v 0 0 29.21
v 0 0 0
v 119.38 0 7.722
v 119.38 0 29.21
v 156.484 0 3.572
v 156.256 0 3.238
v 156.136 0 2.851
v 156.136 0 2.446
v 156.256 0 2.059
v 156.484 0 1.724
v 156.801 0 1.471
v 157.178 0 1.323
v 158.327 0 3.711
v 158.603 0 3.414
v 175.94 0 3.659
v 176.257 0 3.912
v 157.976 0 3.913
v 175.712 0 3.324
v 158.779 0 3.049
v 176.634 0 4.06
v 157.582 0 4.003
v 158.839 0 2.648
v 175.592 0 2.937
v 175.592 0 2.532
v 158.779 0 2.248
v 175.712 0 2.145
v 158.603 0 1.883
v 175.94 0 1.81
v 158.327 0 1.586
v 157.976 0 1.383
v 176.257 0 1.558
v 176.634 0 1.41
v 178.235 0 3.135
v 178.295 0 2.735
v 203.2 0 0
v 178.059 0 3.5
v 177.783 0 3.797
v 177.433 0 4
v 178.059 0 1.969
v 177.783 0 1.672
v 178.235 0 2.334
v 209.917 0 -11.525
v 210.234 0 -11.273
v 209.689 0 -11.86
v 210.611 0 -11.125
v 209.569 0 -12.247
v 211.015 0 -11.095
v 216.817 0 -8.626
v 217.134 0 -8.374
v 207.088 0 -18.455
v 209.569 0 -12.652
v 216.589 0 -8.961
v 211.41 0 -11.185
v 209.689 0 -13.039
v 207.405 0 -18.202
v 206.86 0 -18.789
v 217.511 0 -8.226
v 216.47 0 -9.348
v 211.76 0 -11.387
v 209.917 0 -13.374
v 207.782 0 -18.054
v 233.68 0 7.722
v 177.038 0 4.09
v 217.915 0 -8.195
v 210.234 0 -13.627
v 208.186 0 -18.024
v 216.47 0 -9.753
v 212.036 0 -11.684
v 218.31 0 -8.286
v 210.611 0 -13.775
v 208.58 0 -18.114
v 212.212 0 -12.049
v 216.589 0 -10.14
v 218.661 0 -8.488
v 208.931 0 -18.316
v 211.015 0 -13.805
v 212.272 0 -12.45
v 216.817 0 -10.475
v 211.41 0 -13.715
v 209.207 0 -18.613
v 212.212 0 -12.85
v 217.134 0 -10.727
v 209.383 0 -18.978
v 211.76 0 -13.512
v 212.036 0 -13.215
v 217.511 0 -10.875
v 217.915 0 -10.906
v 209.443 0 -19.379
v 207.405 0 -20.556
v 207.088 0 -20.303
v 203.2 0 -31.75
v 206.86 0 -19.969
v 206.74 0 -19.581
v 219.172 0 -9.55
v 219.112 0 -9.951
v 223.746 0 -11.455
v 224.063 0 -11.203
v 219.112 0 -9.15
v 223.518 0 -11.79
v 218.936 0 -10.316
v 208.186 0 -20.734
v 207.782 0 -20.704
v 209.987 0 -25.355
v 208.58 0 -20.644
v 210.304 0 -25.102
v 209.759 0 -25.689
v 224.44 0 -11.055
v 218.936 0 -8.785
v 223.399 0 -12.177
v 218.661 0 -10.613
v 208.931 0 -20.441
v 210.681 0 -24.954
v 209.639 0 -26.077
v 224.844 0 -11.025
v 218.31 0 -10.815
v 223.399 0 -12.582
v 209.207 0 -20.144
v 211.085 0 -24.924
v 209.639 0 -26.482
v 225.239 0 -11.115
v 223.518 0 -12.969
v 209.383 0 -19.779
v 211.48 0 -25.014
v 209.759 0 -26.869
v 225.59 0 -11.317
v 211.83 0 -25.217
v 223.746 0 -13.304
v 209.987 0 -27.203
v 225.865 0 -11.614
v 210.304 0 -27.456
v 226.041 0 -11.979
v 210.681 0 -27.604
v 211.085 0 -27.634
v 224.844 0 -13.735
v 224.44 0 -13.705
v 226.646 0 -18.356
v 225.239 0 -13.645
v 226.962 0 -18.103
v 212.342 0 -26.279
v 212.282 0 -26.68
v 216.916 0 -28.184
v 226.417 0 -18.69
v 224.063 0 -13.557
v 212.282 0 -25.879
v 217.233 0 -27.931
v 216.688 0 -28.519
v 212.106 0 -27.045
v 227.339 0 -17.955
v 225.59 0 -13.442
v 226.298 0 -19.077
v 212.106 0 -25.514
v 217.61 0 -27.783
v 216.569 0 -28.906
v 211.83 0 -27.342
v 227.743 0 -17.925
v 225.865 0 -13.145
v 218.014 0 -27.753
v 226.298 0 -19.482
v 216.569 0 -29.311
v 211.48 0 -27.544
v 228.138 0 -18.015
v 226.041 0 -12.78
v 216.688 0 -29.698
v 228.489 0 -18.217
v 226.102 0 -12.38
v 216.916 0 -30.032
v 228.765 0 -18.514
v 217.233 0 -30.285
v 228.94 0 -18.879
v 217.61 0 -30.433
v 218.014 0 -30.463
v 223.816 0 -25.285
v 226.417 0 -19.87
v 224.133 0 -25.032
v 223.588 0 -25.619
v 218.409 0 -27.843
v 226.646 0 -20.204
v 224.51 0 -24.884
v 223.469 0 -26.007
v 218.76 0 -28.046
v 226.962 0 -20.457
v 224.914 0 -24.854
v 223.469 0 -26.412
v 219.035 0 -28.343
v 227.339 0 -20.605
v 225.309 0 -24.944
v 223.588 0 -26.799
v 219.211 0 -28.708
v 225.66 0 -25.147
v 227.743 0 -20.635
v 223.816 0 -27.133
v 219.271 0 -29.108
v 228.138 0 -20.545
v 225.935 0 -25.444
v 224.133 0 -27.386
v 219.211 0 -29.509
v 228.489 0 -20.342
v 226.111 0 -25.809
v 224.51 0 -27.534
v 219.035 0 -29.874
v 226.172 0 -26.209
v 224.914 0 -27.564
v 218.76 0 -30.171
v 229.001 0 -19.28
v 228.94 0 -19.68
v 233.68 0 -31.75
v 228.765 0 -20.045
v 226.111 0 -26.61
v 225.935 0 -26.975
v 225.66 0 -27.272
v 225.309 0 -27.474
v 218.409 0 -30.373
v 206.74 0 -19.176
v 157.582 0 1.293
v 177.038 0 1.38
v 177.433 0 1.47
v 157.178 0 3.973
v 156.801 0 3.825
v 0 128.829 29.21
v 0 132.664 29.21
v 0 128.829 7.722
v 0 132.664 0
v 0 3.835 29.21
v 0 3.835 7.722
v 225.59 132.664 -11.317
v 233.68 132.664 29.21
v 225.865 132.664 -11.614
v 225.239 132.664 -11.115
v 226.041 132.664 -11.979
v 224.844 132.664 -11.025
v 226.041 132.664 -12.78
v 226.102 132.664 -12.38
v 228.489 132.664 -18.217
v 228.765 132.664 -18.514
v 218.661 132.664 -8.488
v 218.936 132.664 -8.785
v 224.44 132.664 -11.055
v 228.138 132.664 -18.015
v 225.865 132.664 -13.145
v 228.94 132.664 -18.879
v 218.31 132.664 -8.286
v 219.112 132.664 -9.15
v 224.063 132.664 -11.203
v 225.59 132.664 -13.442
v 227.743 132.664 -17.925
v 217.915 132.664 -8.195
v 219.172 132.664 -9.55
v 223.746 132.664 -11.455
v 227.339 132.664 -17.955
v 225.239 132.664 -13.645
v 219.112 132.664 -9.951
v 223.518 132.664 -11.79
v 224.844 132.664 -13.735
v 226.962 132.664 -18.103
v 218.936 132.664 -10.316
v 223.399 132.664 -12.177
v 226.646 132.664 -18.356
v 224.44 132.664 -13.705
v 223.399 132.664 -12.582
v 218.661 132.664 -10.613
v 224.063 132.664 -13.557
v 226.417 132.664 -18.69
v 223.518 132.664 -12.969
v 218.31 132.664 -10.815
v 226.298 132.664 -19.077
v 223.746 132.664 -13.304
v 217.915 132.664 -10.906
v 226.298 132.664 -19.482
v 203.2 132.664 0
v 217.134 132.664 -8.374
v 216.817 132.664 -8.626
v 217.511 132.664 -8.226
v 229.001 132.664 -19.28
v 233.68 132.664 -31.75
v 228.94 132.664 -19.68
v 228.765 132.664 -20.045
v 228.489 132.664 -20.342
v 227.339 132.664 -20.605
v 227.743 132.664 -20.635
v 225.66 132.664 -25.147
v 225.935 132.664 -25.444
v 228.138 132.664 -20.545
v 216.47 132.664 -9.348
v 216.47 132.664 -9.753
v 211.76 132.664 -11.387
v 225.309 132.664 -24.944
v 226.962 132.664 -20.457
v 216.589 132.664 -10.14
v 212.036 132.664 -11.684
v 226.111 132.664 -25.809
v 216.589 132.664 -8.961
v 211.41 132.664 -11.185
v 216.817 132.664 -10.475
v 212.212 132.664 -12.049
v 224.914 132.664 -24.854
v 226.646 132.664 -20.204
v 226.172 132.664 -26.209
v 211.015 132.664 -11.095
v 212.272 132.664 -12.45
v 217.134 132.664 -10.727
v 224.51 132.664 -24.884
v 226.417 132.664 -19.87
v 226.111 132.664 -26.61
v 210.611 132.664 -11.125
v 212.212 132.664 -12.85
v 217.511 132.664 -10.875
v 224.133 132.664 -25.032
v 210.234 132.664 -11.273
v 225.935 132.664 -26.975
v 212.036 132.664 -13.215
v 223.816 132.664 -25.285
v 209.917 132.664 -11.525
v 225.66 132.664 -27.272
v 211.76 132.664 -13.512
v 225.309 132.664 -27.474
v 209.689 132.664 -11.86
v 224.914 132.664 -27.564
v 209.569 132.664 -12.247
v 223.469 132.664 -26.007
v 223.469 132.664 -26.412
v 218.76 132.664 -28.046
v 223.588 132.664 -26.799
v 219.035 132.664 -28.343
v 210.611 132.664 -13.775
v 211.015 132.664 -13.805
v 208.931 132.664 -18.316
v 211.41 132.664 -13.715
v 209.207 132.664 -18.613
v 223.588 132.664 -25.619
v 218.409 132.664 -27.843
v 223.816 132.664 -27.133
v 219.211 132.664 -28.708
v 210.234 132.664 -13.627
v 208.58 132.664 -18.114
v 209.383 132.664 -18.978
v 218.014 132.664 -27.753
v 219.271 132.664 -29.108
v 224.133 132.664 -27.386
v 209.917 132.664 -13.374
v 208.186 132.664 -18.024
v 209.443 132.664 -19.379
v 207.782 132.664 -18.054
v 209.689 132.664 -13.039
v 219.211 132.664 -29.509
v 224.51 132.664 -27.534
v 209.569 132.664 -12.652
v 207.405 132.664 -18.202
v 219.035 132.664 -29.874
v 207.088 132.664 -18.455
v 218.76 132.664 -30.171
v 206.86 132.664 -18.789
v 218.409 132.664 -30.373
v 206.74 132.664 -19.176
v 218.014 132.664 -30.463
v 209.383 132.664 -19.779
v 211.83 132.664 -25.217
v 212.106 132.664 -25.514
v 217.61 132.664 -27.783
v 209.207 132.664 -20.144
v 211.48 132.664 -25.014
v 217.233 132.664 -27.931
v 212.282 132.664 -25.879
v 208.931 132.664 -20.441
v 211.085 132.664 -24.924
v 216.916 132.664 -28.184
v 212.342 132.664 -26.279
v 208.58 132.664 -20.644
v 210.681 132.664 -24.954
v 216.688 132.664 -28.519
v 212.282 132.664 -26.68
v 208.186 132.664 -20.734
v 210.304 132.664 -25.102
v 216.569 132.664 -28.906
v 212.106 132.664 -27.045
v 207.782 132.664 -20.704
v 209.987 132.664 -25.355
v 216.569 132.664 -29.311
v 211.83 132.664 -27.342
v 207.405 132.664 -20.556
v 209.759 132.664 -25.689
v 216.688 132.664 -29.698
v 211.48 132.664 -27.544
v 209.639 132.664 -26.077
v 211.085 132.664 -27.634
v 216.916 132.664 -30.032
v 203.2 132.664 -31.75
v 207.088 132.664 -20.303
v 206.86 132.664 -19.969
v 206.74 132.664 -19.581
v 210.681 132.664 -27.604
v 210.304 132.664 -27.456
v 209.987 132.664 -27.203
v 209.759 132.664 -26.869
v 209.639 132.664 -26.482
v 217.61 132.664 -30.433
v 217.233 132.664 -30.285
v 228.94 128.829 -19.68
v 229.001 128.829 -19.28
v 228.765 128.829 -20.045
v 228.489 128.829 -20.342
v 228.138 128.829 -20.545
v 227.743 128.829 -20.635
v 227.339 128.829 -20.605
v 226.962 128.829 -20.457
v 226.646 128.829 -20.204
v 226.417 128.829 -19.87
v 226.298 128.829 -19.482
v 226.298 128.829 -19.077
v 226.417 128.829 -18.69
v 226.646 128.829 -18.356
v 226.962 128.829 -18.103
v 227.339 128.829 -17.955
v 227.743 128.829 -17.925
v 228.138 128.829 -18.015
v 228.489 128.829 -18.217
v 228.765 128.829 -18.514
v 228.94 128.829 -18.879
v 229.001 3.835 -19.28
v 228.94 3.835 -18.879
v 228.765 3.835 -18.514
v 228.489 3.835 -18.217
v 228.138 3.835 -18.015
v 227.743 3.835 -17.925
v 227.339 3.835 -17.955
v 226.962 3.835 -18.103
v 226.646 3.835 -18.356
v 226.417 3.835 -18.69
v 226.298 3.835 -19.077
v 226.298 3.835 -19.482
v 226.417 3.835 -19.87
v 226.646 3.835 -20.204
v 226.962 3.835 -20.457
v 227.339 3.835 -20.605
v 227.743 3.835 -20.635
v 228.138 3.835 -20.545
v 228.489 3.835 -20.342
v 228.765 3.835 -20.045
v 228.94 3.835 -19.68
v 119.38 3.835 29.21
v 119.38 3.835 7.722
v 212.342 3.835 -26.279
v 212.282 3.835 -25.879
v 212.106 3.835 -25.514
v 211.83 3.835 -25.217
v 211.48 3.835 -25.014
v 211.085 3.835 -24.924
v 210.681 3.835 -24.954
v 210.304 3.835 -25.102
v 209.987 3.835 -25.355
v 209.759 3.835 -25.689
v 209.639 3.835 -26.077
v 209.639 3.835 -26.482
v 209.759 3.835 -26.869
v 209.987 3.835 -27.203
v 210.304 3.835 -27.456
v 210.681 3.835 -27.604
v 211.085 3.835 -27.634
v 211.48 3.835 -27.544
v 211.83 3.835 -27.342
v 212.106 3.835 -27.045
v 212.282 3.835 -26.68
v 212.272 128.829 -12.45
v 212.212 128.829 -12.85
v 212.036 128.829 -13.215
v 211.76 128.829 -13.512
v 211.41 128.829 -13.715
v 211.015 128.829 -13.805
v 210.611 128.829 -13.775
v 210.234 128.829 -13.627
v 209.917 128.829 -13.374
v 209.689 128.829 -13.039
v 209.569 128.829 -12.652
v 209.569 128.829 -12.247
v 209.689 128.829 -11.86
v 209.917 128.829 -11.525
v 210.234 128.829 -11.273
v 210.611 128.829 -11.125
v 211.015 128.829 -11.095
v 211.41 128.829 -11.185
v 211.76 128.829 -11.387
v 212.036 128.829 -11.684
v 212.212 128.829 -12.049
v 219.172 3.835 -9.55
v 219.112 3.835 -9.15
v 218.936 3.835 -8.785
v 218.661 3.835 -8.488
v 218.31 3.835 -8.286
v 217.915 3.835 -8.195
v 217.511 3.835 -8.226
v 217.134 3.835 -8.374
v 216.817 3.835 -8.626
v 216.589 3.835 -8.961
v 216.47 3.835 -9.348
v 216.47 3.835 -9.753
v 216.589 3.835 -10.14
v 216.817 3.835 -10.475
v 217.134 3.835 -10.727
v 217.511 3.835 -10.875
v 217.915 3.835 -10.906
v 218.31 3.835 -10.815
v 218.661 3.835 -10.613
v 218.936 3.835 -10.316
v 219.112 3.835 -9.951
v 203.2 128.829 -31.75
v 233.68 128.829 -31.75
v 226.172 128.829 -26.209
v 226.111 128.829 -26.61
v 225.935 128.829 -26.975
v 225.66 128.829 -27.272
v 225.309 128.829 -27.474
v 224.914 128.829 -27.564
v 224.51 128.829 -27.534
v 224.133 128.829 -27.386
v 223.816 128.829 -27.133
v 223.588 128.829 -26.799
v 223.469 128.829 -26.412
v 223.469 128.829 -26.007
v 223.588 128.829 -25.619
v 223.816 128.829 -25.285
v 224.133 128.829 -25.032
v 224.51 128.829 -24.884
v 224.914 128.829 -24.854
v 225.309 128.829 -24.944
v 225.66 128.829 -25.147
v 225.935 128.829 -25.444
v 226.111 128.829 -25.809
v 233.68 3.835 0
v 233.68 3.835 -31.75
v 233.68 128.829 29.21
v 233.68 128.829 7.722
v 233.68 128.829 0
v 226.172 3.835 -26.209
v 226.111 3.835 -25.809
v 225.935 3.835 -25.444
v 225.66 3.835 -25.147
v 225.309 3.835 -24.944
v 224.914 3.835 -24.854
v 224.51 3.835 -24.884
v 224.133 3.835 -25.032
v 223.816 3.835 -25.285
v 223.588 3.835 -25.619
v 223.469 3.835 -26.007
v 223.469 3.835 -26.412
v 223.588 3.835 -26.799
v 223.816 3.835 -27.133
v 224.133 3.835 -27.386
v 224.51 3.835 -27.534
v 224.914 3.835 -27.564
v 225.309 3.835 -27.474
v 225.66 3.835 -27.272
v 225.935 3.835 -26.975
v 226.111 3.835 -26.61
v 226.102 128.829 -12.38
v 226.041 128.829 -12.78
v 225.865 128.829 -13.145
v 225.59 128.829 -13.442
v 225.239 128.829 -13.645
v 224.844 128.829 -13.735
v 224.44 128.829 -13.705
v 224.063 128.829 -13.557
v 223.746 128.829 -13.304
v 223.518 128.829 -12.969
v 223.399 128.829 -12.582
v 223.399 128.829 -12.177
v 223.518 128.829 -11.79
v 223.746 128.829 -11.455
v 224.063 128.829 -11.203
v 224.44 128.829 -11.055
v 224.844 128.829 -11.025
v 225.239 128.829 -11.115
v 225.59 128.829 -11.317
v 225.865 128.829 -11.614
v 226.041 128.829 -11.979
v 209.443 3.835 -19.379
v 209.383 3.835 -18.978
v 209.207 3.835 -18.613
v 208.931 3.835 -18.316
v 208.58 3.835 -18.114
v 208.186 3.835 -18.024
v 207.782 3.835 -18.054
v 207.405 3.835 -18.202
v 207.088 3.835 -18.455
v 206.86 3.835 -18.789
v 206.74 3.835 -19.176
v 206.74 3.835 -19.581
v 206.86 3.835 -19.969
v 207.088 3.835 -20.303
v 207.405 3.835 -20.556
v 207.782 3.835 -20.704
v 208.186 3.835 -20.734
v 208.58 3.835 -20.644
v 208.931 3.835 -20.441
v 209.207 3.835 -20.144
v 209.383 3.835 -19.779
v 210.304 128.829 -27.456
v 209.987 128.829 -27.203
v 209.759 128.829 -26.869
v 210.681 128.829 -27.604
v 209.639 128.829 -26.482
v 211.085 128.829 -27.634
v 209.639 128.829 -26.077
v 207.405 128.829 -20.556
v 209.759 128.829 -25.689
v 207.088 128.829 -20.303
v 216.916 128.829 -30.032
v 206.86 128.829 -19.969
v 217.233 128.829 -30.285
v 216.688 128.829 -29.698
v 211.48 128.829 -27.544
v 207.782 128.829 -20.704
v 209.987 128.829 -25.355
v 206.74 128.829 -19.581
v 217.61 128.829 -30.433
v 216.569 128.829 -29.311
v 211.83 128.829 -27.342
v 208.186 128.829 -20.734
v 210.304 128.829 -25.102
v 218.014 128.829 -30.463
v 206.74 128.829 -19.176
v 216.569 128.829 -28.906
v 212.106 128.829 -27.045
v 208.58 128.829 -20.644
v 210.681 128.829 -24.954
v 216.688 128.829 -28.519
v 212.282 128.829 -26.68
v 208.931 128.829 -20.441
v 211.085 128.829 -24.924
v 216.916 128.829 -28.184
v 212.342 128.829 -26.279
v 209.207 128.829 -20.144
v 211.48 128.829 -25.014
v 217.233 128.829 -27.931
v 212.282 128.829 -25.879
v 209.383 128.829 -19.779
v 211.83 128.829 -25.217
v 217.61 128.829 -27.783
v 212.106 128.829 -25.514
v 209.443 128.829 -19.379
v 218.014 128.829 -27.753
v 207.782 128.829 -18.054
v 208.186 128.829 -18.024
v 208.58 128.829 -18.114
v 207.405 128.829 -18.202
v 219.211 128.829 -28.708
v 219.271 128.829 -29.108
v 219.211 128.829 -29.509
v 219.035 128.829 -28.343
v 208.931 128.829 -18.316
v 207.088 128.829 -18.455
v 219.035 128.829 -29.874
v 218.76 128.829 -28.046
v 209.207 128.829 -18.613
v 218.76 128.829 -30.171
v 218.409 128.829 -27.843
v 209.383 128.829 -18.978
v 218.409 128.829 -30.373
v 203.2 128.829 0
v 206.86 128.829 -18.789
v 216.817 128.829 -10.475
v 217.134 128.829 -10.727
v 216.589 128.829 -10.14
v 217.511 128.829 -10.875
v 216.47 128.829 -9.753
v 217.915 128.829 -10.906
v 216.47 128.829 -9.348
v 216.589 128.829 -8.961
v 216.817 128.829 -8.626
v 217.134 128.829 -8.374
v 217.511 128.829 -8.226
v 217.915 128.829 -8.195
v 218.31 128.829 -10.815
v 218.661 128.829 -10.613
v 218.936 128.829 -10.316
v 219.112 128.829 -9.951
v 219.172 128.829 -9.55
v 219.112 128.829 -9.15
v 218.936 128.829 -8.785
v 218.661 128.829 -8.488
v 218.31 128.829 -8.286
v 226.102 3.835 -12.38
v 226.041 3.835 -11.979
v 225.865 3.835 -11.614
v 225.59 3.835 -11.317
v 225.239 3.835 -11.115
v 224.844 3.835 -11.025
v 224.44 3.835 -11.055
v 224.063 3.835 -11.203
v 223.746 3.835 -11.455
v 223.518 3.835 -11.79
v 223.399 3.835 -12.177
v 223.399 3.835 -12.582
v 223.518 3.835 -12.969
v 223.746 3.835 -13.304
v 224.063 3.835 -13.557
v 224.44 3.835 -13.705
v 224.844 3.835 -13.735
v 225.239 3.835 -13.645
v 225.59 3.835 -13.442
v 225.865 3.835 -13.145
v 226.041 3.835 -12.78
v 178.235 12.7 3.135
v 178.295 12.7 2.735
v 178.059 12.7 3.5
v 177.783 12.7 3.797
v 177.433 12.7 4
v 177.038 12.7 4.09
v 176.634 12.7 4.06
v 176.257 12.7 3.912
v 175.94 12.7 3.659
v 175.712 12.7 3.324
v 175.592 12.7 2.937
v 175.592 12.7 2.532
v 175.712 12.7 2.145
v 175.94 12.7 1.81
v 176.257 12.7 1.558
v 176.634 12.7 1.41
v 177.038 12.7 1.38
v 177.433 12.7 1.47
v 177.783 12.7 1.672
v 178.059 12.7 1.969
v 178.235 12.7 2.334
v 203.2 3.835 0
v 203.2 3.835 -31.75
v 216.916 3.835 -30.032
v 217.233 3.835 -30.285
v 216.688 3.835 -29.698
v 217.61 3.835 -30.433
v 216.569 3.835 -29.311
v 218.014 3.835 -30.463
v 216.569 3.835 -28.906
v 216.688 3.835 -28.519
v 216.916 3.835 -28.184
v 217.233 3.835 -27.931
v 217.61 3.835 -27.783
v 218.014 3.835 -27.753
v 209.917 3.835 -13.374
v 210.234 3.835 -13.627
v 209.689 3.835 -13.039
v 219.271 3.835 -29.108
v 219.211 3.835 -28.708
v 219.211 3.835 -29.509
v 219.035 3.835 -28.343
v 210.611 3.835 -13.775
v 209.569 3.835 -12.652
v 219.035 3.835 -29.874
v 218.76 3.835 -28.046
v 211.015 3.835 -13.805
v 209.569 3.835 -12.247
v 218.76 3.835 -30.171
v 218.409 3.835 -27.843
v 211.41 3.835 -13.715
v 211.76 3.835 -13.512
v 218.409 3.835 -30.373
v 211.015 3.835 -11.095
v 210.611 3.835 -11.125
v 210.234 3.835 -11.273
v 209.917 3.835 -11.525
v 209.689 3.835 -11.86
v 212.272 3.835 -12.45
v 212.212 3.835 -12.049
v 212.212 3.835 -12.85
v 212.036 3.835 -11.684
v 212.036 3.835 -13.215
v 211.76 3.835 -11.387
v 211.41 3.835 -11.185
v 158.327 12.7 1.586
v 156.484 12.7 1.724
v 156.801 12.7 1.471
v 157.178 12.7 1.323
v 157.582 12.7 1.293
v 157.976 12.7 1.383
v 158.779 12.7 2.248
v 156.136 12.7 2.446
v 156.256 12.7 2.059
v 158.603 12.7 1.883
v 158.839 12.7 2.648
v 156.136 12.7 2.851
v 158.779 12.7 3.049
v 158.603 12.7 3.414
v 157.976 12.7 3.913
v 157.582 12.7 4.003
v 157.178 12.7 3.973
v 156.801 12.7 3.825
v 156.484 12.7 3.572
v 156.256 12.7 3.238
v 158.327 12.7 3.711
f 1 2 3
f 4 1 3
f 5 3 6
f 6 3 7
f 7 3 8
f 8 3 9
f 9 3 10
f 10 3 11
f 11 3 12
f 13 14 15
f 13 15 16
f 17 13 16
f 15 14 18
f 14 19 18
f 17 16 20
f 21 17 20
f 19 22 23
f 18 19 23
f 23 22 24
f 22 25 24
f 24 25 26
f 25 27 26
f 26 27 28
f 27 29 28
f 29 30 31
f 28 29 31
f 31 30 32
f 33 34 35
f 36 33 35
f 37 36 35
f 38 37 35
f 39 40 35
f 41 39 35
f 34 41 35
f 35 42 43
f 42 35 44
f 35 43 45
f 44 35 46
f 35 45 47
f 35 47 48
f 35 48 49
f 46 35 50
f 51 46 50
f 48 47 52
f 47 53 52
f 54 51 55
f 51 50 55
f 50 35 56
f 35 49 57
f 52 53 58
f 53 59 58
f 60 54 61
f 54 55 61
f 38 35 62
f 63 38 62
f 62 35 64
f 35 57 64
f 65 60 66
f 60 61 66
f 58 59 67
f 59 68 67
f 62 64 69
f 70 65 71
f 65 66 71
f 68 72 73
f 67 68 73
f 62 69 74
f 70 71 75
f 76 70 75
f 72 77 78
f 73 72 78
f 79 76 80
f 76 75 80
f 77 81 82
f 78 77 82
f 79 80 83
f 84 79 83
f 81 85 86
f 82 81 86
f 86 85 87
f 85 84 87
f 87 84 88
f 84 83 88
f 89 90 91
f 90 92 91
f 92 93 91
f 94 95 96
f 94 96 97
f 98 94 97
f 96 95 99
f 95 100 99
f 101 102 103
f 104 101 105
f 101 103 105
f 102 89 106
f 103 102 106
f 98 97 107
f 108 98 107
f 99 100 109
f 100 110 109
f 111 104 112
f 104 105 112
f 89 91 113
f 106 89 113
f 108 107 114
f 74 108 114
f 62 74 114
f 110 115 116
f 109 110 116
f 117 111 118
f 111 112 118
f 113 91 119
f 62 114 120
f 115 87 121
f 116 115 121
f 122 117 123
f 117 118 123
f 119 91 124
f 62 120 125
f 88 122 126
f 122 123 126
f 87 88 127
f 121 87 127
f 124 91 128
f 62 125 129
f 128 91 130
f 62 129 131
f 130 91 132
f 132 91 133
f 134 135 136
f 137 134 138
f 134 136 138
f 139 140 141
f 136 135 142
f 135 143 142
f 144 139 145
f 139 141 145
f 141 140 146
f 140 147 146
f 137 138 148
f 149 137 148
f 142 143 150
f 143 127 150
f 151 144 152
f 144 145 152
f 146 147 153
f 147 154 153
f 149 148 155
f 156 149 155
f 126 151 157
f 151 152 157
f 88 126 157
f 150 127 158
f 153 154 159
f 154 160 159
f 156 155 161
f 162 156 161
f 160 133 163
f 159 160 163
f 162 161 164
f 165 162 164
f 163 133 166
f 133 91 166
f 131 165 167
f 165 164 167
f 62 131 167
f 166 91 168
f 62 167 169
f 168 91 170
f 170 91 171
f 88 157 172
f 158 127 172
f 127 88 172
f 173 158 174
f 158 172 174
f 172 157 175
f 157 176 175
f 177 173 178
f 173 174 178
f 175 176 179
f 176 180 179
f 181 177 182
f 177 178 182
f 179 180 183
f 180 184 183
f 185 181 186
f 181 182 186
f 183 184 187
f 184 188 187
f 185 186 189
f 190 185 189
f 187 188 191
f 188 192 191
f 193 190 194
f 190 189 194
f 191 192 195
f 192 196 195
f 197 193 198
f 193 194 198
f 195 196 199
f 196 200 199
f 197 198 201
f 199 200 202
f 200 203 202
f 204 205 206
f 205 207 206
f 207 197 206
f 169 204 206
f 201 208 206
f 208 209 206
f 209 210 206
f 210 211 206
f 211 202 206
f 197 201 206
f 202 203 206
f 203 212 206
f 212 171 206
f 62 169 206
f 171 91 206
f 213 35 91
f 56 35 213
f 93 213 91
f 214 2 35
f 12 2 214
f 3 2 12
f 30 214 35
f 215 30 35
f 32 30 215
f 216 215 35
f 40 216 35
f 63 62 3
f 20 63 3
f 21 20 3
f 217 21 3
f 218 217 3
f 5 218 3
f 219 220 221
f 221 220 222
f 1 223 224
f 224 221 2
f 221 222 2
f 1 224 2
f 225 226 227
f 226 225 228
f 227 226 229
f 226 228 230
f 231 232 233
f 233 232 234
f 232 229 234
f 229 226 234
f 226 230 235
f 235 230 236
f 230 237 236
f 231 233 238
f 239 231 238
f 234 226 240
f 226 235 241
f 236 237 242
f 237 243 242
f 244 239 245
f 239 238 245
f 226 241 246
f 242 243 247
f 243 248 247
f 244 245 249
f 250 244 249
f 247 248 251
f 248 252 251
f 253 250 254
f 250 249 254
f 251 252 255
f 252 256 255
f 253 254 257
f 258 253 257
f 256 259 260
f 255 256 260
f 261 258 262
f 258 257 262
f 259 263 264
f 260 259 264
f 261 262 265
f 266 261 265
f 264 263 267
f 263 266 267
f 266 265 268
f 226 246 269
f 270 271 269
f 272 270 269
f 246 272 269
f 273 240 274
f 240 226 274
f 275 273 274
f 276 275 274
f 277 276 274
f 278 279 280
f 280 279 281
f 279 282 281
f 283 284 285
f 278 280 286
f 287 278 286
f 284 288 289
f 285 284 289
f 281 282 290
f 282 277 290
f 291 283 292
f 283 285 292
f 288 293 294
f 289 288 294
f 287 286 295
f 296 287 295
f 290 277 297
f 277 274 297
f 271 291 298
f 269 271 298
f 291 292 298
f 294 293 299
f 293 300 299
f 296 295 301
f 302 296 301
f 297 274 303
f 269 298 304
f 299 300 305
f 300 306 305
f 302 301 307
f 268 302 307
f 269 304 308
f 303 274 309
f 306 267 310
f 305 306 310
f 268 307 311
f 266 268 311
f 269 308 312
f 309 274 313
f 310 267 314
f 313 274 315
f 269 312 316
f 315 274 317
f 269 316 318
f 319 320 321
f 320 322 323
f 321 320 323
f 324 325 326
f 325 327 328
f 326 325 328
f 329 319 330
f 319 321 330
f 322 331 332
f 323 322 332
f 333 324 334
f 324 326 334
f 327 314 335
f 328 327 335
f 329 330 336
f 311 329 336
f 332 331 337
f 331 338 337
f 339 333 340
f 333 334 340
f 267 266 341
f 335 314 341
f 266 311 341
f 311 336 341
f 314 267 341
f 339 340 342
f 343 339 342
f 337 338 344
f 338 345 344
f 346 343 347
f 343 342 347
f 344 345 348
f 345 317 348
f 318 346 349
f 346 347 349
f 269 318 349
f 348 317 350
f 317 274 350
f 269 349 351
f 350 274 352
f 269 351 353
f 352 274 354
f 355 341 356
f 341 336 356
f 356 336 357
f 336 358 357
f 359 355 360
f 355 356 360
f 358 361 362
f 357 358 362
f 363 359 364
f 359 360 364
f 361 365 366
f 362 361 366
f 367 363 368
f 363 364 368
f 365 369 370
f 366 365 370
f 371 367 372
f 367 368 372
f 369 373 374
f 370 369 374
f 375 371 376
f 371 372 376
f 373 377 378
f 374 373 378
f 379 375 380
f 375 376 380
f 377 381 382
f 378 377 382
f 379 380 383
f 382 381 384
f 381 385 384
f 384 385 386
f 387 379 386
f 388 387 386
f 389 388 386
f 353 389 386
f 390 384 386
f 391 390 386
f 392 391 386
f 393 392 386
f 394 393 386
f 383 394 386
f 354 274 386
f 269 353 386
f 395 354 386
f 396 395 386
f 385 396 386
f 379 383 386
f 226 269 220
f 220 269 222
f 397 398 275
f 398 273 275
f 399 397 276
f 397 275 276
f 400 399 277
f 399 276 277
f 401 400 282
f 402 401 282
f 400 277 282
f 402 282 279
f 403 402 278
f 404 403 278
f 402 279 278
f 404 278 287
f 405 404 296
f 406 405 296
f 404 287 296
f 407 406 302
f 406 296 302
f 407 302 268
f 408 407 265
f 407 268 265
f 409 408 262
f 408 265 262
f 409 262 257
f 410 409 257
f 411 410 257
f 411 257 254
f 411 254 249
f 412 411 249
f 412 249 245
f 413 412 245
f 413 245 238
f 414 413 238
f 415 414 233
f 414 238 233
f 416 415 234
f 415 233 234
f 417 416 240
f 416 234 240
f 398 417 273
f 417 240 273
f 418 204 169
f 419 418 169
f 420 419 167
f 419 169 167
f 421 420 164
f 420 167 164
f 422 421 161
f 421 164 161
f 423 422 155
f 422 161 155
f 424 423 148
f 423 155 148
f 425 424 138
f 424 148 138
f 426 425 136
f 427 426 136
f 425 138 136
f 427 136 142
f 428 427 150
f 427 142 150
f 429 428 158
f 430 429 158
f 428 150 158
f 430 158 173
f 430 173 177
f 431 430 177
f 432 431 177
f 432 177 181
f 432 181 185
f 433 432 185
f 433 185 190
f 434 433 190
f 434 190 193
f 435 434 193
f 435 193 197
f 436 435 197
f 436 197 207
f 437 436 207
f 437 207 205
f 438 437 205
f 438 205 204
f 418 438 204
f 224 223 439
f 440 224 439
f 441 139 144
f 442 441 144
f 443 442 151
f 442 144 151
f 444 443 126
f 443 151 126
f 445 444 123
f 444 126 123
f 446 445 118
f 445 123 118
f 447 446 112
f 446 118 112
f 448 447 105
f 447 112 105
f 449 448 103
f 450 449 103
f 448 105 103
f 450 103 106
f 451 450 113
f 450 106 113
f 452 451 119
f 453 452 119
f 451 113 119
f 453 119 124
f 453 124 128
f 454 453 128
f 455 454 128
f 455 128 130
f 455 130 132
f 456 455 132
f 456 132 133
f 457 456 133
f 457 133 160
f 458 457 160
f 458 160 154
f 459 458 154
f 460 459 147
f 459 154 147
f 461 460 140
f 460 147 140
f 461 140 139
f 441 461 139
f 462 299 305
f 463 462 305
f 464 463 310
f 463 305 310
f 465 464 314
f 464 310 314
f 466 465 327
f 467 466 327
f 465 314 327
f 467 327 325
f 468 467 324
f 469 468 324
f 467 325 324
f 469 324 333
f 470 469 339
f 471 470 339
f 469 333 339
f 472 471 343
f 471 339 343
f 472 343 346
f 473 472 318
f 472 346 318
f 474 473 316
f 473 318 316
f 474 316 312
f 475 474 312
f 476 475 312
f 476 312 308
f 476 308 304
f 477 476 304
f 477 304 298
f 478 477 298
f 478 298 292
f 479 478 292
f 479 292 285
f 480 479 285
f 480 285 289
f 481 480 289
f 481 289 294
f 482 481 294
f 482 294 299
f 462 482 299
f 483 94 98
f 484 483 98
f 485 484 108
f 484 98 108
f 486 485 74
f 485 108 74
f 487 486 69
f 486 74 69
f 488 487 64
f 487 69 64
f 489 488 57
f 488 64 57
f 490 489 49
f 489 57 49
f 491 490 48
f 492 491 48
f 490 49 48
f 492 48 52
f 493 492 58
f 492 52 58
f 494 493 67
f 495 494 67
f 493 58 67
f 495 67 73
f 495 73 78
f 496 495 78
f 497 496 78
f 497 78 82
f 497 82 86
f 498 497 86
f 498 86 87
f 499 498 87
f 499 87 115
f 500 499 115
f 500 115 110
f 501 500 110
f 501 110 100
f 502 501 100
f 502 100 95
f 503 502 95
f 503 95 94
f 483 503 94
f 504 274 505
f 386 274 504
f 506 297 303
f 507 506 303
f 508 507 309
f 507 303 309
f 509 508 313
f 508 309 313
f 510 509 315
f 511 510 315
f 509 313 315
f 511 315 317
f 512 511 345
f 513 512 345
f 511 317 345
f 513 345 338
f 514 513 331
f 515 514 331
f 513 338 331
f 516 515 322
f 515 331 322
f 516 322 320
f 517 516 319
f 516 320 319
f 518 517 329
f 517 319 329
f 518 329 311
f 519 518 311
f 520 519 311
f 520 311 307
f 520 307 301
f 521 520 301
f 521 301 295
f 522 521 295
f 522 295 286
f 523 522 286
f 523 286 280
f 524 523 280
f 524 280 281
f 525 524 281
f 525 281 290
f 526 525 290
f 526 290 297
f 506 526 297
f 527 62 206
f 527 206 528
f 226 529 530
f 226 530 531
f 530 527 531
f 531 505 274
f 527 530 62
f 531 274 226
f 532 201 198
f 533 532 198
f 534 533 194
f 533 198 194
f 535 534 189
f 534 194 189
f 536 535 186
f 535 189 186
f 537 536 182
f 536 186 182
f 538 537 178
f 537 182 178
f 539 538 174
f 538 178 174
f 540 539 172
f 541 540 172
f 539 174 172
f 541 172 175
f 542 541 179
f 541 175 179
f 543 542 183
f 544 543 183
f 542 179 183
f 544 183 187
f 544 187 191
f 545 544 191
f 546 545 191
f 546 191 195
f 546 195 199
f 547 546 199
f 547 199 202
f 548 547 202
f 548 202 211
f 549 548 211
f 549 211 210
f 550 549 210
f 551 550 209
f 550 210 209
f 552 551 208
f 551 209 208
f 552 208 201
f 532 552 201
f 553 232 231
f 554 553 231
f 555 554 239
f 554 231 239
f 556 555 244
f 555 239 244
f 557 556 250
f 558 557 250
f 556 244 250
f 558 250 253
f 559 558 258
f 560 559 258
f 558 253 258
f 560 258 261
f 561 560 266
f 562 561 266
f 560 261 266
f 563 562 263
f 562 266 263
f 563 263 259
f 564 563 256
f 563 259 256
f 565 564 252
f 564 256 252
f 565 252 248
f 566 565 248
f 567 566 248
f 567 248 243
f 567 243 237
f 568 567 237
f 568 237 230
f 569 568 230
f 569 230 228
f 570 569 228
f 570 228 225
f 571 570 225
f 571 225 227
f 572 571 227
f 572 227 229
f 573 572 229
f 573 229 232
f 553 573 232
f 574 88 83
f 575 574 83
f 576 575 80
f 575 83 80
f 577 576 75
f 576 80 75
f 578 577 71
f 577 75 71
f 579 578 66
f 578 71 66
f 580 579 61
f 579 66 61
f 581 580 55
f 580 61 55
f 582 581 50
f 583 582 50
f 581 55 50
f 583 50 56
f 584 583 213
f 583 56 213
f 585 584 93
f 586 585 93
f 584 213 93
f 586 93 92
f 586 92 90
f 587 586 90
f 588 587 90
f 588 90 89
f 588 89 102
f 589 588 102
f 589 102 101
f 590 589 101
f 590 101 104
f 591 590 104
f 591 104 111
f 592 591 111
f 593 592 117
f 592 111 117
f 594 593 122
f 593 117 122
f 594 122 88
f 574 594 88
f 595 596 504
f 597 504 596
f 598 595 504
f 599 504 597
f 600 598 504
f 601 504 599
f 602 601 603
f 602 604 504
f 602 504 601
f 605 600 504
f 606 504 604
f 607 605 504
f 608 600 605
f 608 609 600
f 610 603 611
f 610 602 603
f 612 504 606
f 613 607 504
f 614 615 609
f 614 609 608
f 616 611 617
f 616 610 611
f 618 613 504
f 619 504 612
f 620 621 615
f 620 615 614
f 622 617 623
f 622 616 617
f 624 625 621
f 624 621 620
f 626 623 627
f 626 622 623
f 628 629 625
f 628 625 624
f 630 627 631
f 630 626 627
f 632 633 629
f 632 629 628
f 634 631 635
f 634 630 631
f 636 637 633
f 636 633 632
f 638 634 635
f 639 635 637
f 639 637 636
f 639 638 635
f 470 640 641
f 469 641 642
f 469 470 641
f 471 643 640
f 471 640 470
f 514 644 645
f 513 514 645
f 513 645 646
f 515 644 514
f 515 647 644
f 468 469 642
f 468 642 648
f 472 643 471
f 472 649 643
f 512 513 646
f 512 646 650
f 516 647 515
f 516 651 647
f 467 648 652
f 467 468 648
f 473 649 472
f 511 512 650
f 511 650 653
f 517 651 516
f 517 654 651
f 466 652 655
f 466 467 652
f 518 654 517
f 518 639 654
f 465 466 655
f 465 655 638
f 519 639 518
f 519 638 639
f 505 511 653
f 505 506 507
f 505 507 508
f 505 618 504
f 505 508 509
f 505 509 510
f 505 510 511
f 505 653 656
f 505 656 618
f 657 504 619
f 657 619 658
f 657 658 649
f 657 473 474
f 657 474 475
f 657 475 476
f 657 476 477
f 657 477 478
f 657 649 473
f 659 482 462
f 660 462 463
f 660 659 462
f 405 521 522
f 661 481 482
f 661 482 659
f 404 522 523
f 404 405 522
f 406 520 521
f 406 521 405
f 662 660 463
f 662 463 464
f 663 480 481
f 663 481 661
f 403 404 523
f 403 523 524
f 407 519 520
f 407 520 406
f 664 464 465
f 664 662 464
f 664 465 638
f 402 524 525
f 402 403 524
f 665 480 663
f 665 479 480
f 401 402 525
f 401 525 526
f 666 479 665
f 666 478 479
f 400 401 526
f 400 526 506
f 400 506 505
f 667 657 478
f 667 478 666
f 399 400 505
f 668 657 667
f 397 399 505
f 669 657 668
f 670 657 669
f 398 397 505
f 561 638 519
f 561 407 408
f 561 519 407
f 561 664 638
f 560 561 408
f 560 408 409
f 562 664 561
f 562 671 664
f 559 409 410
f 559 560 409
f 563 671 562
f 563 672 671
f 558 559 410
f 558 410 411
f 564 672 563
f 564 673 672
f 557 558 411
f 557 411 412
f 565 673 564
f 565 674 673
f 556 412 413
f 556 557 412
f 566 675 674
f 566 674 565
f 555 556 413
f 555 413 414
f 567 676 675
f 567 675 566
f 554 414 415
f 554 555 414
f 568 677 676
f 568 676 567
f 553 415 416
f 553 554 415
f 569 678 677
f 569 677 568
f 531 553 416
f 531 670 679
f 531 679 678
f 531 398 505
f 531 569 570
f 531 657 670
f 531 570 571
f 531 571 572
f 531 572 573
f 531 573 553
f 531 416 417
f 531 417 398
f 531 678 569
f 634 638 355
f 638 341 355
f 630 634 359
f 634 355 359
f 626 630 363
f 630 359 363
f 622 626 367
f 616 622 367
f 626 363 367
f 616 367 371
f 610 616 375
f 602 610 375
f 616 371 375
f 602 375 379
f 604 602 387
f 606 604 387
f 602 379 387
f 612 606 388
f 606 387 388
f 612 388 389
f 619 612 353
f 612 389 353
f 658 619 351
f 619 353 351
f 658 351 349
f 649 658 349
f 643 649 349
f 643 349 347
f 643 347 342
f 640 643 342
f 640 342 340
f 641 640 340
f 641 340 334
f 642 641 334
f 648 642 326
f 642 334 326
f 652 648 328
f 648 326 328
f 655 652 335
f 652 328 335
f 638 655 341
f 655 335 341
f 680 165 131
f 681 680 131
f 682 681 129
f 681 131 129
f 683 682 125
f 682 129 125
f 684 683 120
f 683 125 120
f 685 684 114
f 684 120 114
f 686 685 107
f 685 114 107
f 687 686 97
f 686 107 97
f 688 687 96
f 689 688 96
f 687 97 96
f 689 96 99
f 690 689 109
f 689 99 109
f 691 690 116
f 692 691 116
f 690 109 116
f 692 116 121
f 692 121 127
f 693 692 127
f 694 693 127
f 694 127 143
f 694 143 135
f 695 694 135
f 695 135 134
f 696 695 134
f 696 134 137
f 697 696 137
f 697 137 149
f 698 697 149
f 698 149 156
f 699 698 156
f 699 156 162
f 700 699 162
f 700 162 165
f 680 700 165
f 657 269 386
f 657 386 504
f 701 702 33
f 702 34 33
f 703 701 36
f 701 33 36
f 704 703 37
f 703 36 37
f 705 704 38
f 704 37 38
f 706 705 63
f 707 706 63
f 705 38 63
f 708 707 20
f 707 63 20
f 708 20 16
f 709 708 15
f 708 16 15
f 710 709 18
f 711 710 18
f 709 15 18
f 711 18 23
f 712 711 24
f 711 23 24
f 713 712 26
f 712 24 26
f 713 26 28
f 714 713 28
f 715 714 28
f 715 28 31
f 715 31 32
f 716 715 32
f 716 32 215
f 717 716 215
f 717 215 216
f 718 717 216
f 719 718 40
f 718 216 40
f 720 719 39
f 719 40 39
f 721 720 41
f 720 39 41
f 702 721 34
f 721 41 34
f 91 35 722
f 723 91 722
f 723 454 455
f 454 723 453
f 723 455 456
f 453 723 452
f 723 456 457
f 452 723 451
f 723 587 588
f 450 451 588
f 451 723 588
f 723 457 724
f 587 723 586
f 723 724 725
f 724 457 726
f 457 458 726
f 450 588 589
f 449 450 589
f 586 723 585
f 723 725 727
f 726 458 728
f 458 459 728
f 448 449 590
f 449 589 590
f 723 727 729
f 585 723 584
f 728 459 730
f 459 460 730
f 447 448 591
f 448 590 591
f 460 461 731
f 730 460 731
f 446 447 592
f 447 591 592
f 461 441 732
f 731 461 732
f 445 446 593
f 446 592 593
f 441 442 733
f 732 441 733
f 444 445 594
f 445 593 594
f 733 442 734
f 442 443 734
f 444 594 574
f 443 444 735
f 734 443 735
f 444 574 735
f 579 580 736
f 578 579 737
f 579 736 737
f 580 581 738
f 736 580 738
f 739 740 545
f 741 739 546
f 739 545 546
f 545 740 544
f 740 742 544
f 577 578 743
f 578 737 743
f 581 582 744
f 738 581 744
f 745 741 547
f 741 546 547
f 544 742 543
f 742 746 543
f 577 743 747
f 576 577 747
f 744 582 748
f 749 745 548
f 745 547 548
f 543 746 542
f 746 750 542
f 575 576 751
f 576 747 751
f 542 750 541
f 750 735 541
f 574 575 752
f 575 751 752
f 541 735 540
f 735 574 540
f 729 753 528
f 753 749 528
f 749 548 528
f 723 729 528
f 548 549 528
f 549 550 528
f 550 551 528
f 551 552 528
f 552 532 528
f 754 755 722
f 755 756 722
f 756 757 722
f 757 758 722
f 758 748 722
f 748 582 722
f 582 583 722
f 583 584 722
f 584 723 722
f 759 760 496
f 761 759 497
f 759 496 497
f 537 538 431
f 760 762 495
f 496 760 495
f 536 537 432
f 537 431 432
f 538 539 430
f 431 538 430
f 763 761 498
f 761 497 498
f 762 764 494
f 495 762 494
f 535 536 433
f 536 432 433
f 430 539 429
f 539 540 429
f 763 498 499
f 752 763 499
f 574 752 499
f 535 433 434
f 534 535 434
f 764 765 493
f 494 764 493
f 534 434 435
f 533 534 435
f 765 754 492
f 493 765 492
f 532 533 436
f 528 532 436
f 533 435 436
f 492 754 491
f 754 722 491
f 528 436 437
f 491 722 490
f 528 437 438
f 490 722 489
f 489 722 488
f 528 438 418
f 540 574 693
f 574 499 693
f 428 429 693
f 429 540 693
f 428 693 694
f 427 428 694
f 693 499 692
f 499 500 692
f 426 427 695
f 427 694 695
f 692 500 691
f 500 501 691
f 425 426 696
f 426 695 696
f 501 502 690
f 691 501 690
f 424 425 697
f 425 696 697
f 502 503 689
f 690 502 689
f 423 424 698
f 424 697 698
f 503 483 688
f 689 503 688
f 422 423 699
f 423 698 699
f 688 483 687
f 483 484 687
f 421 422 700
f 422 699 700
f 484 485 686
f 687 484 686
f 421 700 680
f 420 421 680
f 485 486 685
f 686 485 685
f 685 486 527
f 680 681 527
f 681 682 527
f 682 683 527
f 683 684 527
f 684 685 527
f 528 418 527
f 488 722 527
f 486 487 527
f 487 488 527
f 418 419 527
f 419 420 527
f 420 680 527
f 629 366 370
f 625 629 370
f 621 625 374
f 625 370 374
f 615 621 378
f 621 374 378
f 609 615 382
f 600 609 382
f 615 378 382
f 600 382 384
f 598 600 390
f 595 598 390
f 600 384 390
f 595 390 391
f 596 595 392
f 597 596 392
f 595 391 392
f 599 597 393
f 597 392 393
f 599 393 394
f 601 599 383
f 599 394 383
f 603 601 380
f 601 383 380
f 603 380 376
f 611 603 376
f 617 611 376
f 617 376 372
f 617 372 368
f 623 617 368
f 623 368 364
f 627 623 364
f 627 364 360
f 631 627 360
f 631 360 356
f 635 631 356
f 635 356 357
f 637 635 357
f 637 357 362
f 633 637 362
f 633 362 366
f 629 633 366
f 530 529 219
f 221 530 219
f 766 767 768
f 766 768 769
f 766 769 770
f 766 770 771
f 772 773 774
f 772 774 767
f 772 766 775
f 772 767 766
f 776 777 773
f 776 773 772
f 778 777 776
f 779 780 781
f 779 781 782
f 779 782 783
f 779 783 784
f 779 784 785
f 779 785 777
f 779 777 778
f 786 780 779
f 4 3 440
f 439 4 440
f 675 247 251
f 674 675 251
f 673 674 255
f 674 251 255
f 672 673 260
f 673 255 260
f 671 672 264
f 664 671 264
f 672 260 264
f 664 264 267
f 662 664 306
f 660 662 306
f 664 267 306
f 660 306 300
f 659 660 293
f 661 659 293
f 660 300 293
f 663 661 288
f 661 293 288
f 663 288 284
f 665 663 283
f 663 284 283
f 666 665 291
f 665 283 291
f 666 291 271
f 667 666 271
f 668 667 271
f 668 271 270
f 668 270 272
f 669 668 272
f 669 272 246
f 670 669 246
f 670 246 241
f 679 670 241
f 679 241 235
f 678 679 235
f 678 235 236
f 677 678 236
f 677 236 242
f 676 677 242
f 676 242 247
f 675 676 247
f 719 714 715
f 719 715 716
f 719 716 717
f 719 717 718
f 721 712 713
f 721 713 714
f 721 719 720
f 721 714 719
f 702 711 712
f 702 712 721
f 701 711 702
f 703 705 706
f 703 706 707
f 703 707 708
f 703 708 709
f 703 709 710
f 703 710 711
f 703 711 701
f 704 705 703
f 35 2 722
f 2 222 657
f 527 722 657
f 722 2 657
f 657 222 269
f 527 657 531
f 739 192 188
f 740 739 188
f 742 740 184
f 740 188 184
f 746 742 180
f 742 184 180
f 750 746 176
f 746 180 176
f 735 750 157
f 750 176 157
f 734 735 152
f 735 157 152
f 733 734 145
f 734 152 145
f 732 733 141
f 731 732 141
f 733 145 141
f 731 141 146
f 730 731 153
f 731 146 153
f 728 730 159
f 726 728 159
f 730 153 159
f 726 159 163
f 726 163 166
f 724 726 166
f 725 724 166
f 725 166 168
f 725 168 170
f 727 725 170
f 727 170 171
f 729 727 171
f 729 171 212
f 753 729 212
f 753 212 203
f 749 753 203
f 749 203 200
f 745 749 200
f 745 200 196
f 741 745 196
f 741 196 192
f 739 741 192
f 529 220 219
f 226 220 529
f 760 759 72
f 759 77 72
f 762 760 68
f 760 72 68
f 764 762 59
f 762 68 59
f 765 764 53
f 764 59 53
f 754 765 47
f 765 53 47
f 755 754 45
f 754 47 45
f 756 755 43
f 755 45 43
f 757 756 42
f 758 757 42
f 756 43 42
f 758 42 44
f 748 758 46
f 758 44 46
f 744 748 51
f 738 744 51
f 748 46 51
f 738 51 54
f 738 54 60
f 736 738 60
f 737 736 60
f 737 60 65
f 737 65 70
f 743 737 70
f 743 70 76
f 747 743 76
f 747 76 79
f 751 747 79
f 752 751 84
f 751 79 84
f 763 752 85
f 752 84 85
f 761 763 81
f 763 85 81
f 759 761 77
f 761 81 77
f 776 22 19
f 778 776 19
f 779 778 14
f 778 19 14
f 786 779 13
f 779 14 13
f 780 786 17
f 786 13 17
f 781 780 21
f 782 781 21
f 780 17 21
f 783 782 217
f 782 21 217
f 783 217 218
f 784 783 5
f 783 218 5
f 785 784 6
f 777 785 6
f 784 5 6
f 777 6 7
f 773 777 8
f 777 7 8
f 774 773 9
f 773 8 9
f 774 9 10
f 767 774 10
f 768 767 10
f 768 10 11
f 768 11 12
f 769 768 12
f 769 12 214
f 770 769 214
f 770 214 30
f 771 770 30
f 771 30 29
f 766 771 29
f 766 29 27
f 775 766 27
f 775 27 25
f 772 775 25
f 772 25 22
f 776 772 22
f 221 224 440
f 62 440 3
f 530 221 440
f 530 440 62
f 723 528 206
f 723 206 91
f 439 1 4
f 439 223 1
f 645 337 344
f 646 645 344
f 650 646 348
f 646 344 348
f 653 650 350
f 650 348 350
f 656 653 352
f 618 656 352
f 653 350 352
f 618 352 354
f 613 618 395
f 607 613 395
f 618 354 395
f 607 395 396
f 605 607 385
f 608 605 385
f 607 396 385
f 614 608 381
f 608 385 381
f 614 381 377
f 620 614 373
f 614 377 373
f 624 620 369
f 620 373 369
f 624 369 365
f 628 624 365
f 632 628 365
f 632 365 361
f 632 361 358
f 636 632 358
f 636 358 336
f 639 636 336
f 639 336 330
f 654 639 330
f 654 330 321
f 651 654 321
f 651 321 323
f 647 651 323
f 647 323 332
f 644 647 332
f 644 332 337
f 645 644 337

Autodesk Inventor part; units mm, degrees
ref_plane "YZ Plane" through (0, 0, 0) normal (1, 0, 0) x (0, 1, 0)
ref_plane "XZ Plane" through (0, 0, 0) normal (0, 1, 0) x (-1, 0, 0)
sketch "Sketch1" plane through (0, 0, 0) normal (0, 0, 1) x (1, 0, 0)
  line L0 (0, 0) -> (233.68, 0)
  line L1 (233.68, 0) -> (233.68, 132.6642)
  line L2 (233.68, 132.6642) -> (0, 132.6642)
  line L3 (0, 132.6642) -> (0, 0)
  dimension "d0" = 132.6642
  dimension "d1" = 233.68
extrude "Extrusion1" add sketch "Sketch1" along normal blind 29.21
sketch "Sketch2" plane through (0, 0, 29.21) normal (0, 0, 1) x (1, 0, 0)
  line L0 (-0.3825, 3.8354) -> (233.706, 3.8354)
  line L1 (233.706, 3.8354) -> (233.706, 128.8288)
  line L2 (233.706, 128.8288) -> (-0.3825, 128.8288)
  line L3 (-0.3825, 128.8288) -> (-0.3825, 3.8354)
  line L4 (233.68, 132.6642) -> (0, 132.6642) projected
  line L5 (0, 0) -> (233.68, 0) projected
  dimension "d4" = 3.8354
  dimension "d5" = 3.8354
extrude "Extrusion2" cut sketch "Sketch2" against normal blind 21.4884
sketch "Sketch3" plane through (0, 0, 29.21) normal (0, 0, 1) x (1, 0, 0)
  line L0 (233.68, 0) -> (119.38, 0)
  line L1 (119.38, 0) -> (119.38, 3.8354)
  line L2 (119.38, 3.8354) -> (233.68, 3.8354)
  line L3 (233.68, 3.8354) -> (233.68, 0)
  point P0 (0, 0)
  dimension "d8" = 114.3
  dimension "d9" = 3.8354
extrude "Extrusion3" cut sketch "Sketch3" against normal blind 21.4884
sketch "Sketch4" plane through (0, 0, 0) normal (0, 0, -1) x (-1, 0, 0)
  line L0 (-233.68, 0) -> (-233.68, 132.6642) projected
  line L1 (-233.68, 132.6642) -> (-203.2, 132.6642)
  line L2 (-203.2, 132.6642) -> (-203.2, 128.8288)
  line L3 (-203.2, 128.8288) -> (-233.68, 128.8288)
  line L4 (-233.68, 128.8288) -> (-233.68, 132.6642)
  line L5 (-233.68, 0) -> (-203.2, 0)
  line L6 (-203.2, 0) -> (-203.2, 3.8354)
  line L7 (-203.2, 3.8354) -> (-233.68, 3.8354)
  line L8 (-233.68, 3.8354) -> (-233.68, 0)
  point P0 (0, 0)
  dimension "d12" = 3.8354
  dimension "d13" = 30.48
  dimension "d14" = 3.8354
  dimension "d15" = 30.48
extrude "Extrusion4" add sketch "Sketch4" along normal blind 31.75
sketch "Sketch7" plane through (0, 132.6642, 29.21) normal (0, 1, 0) x (1, 0, 0)
  circle A0 centre (217.8629, 48.5394) radius 2.54
  circle A1 centre (217.8134, 38.7605) radius 1.3589
  circle A2 centre (224.7426, 41.5897) radius 1.3589
  circle A3 centre (227.6418, 48.4899) radius 1.3589
  circle A4 centre (224.8126, 55.4191) radius 1.3589
  circle A5 centre (217.9124, 58.3182) radius 1.3589
  circle A6 centre (210.9832, 55.4891) radius 1.3589
  circle A7 centre (208.084, 48.5889) radius 1.3589
  circle A8 centre (210.9132, 41.6597) radius 1.3589
  point P0 (0, 29.21)
  dimension "d39" = 5.08
  dimension "d40" = 2.7178
  dimension "d41" = 9.779
  dimension "d44" = 360
extrude "Extrusion7" cut sketch "Sketch7" against normal blind 12.7 contours A1 | A2 | A3 | A4 | A5 | A6 | A7 | A8
ref_plane "Work Plane1" through (0, 66.3321, 0) normal (0, -1, 0) x (1, 0, 0)
mirror "Mirror2" about plane through (0, 66.3321, 0) normal (0, -1, 0) of "Extrusion7"
sketch "Sketch9" plane through (0, 0, 0) normal (0, -1, 0) x (1, 0, 0)
  circle A0 centre (157.48, 2.6482) radius 1.3589
  circle A1 centre (176.9362, 2.7347) radius 1.3589
  line L0 (119.38, 7.7216) -> (119.38, 29.21) projected
  point P0 (0, 0)
  dimension "d57" = 2.7178
  dimension "d58" = 19.4564
  dimension "d59" = 2.7178
  dimension "d60" = 38.1
extrude "Extrusion9" cut sketch "Sketch9" against normal blind 12.7
properties part number "Guide"
